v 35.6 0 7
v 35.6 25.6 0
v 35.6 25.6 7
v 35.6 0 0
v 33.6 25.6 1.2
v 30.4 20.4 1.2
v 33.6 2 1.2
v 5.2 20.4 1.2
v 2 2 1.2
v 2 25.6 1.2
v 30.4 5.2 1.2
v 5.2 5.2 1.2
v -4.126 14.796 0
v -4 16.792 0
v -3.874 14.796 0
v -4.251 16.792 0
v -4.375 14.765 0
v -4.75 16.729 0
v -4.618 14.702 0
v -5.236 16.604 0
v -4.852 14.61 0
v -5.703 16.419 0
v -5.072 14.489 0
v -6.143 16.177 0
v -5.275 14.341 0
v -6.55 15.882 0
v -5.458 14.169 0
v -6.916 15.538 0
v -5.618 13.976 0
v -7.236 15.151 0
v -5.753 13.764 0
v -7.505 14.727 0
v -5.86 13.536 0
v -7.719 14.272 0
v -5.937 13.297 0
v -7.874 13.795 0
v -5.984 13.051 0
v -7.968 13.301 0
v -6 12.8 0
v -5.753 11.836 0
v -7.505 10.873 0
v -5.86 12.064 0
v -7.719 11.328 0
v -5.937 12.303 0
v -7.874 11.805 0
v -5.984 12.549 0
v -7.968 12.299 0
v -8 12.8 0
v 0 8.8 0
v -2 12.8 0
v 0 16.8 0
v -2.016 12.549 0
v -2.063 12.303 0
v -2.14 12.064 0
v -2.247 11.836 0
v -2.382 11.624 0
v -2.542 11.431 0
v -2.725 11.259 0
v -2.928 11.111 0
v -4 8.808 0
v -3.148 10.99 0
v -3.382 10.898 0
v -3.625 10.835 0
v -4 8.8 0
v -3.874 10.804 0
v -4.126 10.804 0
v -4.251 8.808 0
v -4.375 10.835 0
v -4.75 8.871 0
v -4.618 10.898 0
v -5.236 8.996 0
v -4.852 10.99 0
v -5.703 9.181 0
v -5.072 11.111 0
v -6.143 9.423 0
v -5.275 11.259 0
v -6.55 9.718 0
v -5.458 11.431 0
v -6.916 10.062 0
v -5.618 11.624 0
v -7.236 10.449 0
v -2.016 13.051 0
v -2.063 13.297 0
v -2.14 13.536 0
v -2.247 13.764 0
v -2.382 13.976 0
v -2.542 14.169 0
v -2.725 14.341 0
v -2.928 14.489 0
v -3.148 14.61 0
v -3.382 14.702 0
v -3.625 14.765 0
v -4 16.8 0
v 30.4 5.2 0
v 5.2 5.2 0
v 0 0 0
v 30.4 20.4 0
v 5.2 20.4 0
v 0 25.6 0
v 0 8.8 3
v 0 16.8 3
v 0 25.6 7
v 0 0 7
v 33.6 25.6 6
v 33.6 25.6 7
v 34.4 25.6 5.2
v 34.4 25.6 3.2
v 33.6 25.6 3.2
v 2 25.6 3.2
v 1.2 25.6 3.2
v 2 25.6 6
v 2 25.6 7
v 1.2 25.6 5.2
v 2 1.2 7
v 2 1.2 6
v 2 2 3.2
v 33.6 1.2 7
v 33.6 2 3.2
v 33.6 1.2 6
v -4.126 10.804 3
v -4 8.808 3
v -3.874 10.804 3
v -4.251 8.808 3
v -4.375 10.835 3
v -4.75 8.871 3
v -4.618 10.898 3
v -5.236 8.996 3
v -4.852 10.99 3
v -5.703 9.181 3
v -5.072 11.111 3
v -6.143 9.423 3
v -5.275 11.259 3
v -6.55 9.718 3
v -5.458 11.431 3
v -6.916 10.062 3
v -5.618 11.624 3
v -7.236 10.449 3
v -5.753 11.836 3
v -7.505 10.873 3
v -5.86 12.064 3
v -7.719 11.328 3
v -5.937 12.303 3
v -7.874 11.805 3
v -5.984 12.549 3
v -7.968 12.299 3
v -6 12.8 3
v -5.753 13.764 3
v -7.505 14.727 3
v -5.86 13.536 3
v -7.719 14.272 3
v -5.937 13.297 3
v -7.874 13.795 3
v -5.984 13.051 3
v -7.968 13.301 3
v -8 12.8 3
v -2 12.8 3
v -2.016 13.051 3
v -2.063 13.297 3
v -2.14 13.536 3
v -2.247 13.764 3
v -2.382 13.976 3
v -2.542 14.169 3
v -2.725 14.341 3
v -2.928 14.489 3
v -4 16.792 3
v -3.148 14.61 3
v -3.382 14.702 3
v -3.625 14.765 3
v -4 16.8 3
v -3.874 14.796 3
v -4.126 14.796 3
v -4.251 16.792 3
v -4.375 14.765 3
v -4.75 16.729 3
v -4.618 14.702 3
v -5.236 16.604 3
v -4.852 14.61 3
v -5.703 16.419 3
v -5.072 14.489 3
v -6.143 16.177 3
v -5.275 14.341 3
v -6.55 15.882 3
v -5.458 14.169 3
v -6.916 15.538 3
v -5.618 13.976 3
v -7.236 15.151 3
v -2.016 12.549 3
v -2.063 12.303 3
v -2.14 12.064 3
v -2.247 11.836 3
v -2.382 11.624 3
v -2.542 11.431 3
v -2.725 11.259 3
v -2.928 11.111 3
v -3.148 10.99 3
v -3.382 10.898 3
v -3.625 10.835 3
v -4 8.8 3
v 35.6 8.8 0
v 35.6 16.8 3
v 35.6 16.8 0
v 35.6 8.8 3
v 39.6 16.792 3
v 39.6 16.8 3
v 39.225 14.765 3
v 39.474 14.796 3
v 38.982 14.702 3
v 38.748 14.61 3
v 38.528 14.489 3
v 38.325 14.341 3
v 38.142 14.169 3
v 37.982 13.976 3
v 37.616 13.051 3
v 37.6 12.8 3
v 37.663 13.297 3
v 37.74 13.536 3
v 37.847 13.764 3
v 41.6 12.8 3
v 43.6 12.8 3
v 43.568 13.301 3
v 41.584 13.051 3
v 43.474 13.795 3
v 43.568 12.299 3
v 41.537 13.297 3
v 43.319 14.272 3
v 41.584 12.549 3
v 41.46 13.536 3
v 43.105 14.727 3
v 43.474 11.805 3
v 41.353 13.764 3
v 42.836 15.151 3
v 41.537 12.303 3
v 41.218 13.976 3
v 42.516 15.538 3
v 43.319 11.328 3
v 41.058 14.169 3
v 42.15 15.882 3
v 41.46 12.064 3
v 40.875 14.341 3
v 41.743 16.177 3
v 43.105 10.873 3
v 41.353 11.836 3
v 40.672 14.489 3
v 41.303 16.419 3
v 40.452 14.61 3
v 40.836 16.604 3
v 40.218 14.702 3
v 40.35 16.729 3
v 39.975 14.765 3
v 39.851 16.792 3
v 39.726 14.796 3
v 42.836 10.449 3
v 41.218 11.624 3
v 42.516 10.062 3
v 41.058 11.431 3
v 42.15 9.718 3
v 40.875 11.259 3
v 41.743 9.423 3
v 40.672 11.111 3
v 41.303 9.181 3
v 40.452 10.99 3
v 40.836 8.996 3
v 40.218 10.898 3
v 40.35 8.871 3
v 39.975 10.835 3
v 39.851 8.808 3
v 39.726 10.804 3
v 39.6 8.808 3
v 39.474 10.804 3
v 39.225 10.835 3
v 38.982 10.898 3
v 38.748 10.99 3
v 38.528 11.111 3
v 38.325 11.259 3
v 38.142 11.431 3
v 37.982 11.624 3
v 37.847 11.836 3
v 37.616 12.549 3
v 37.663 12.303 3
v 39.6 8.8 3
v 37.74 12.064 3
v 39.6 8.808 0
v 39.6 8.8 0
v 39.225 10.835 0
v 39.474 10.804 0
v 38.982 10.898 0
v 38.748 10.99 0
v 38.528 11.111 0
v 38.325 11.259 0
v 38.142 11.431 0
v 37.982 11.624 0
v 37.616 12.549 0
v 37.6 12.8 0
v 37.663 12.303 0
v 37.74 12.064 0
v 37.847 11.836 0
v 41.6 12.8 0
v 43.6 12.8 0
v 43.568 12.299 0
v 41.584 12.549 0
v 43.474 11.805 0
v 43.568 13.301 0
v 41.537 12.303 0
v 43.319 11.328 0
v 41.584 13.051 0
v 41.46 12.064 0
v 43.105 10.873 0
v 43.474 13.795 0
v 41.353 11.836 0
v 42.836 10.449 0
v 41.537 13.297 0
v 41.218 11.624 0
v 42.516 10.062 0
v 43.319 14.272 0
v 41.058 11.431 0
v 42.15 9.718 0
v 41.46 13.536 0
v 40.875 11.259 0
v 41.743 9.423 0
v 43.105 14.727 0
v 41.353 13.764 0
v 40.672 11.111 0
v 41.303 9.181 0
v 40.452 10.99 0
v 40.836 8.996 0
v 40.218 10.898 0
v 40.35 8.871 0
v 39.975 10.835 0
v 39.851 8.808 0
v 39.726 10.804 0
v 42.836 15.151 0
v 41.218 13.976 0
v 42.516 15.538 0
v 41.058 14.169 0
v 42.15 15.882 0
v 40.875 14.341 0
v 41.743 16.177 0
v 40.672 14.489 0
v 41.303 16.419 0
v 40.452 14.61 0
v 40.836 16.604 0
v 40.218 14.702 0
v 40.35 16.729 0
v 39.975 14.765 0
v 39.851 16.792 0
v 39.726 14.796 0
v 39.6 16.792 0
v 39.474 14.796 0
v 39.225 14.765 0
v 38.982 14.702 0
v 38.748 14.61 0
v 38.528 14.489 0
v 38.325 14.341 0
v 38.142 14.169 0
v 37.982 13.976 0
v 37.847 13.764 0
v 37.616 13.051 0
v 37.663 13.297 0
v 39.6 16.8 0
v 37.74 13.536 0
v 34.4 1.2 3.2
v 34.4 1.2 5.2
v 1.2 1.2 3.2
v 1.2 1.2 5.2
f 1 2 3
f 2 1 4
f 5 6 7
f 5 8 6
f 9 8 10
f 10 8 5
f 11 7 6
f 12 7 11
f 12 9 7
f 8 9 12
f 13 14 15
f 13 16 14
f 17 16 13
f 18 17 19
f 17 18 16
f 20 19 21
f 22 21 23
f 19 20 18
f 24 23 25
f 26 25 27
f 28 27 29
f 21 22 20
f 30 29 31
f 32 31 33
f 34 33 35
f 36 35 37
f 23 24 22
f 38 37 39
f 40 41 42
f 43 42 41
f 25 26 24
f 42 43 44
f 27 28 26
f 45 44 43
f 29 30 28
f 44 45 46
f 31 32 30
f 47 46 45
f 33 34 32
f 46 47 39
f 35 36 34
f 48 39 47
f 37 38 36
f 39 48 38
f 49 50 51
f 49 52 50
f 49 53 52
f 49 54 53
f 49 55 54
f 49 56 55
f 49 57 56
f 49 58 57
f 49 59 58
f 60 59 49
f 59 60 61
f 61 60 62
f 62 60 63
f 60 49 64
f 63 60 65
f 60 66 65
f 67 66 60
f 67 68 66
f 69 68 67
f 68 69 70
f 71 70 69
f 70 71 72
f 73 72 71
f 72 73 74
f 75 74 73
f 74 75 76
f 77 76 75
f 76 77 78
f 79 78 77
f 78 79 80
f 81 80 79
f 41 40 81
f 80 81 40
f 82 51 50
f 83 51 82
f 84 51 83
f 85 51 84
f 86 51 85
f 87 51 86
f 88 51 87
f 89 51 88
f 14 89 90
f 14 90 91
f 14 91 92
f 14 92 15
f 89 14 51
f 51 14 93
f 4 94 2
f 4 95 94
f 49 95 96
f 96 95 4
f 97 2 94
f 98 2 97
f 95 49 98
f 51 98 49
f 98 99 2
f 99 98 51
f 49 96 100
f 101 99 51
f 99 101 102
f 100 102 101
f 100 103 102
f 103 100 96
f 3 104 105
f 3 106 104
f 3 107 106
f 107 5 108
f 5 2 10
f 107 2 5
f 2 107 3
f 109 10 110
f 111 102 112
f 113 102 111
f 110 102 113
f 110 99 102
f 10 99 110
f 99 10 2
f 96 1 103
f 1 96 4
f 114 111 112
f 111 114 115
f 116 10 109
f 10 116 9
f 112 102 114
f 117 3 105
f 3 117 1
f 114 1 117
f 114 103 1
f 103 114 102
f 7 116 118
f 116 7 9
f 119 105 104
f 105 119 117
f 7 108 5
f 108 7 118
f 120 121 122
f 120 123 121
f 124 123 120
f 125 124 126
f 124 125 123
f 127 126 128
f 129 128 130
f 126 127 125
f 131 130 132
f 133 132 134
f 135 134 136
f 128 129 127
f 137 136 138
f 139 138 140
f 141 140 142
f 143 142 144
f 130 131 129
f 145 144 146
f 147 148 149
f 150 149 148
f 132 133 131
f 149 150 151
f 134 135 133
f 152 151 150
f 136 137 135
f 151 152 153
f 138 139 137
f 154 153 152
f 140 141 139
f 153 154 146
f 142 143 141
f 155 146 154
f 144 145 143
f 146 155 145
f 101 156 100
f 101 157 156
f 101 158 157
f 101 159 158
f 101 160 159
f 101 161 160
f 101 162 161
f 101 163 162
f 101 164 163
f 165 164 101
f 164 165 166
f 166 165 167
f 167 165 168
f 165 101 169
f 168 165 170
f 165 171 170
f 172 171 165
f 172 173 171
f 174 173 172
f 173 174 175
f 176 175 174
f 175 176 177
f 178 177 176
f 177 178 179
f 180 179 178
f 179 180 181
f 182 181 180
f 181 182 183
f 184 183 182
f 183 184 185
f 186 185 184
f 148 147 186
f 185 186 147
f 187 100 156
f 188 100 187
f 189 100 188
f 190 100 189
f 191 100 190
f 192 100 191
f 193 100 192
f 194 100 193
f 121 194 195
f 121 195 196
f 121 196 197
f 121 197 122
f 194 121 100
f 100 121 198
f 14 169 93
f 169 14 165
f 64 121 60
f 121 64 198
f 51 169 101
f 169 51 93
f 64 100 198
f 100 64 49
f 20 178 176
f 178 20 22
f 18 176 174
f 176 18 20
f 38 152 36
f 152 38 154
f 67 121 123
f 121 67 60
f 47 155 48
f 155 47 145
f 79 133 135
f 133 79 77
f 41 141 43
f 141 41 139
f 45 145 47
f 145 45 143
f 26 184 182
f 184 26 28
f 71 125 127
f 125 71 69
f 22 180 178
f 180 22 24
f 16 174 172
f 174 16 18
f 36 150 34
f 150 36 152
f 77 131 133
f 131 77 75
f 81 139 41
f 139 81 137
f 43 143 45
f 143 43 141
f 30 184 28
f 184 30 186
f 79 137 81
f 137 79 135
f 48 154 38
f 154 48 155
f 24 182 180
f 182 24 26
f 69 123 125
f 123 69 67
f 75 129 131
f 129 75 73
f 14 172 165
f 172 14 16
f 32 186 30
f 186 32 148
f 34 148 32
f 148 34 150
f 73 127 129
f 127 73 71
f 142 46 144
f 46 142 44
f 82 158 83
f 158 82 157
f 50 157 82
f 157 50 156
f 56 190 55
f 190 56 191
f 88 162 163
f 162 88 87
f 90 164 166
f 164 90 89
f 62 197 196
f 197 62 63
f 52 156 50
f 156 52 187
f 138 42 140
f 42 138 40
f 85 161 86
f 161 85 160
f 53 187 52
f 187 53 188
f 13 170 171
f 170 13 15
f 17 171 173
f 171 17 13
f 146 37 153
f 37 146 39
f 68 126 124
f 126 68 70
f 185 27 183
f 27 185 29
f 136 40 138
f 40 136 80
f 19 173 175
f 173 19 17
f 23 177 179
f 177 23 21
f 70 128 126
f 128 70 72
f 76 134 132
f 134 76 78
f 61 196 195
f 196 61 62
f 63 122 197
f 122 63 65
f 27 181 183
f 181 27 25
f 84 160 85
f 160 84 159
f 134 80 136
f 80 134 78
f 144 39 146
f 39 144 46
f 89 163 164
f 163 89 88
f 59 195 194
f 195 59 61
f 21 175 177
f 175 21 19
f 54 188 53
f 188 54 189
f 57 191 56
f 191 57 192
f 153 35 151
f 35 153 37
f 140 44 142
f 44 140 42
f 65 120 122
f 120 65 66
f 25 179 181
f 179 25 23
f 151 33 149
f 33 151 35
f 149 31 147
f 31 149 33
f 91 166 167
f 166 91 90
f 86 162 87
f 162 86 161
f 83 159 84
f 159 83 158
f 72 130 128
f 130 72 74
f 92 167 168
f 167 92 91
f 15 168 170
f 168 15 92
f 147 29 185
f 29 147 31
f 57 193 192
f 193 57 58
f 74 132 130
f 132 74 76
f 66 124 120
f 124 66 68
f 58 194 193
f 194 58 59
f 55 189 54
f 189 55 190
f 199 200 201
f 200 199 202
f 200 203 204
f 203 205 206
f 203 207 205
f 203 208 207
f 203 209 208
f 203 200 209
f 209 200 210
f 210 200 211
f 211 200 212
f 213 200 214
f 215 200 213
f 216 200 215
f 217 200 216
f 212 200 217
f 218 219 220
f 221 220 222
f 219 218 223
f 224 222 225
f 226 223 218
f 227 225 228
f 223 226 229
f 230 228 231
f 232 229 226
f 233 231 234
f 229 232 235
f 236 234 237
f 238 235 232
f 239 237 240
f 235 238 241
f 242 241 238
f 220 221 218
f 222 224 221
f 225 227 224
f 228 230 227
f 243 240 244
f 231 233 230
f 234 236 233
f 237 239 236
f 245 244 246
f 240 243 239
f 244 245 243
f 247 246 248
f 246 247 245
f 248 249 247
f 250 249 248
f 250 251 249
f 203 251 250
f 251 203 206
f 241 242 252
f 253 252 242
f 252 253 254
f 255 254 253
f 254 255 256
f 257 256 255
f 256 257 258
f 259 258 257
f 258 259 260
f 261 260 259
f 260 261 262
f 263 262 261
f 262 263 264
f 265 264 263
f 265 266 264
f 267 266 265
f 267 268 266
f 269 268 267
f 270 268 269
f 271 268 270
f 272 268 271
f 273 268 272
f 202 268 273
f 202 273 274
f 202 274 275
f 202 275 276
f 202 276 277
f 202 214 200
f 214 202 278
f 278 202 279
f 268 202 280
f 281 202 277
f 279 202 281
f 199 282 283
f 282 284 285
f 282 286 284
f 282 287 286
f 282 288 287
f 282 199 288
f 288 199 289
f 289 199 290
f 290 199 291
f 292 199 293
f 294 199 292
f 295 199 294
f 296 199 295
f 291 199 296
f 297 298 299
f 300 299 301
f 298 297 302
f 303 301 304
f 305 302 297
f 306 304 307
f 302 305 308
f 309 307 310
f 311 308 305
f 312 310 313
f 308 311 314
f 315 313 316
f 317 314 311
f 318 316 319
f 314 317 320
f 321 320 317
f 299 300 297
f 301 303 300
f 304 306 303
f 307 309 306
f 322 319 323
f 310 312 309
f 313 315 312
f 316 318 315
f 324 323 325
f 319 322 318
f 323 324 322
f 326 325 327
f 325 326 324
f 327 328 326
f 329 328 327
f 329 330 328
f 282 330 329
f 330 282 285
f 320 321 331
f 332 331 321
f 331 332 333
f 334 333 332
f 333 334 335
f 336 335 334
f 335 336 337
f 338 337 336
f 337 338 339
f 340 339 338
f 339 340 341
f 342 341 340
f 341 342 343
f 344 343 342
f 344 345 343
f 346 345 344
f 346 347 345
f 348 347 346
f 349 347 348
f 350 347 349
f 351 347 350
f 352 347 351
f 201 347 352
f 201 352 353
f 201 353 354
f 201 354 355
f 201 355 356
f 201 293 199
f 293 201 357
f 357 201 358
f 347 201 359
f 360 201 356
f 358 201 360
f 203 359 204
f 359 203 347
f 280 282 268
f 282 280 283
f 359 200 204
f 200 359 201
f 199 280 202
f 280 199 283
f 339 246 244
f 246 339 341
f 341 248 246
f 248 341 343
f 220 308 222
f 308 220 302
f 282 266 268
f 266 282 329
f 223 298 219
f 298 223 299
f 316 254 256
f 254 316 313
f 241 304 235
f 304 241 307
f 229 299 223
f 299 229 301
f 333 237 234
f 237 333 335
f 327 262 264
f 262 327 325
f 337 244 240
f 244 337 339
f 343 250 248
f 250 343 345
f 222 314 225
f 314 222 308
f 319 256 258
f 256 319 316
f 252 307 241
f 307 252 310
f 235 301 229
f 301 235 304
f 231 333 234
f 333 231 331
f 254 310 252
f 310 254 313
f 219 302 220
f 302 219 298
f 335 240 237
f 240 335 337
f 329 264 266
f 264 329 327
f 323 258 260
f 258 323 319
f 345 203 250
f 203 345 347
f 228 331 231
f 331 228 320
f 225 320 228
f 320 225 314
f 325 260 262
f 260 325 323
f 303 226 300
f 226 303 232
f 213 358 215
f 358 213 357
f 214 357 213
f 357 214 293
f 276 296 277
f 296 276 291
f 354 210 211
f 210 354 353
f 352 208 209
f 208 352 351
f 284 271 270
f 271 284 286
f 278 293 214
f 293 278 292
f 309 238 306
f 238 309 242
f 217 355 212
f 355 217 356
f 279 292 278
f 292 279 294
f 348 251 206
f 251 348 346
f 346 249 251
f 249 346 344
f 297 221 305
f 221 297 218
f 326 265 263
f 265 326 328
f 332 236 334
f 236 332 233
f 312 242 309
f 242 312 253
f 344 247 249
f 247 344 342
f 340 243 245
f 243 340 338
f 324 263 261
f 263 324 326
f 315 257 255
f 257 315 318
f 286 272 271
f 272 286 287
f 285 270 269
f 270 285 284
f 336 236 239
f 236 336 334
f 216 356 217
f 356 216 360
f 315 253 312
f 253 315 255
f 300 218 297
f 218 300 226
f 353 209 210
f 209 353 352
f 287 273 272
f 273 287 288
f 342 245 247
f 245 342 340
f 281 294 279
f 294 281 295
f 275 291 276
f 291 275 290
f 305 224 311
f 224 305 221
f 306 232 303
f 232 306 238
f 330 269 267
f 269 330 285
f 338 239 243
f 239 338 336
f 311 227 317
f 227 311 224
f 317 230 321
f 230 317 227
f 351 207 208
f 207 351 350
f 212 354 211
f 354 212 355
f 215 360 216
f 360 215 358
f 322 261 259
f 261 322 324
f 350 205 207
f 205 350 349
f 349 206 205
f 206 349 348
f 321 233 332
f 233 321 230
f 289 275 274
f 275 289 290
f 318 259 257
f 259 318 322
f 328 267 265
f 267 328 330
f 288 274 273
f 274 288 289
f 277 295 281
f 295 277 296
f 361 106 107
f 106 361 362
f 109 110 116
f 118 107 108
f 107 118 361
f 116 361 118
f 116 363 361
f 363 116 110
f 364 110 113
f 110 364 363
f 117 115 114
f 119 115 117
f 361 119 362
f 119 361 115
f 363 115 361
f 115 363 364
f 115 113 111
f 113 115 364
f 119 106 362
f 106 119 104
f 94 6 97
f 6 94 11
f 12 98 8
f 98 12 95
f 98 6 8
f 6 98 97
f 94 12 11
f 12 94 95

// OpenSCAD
// file: ../lib/pcb_led_cvf.scad
// for led power module modified

/* bluetooth_mate_holder.scad
 * By John Biehler - November 17, 2011
 * http://www.thingiverse.com/thing:

 * derived from pcb_box_slide_with_tabs.scad
 * By Nicholas C Lewis - Jan 1, 2011
 * http://www.thingiverse.com/thing:5396
 *
 * derived from pcb_box_slide.scad
 *     Parametric, open PCB-box (slide-in) by chlunde
 *     http://www.thingiverse.com/thing:4071
 *
 * CHANGES
 * - adjusted to fit Arduino Mega
 * - added mounting tabs
 * - turned off cutouts
 * - adjusted bottom cutout size
 */

$fn=50;

module pcb_led_cvf(

	pcb_width = 48.2,
	pcb_length =24.1,
	pcb_height =1.1,
	slisse = 0.8,

	pcb_bottom_margin = 1,
	wall_width_thick = 2,
	box_height = 7,

	//tab parameters
	tab_hole_radius=2,
	tab_outer_radius=4,

	inner_margin = 4,

	add_tabs = true

) {
	wall_width = wall_width_thick-slisse;

module tab() {
	difference(){
		union() {
			translate([-tab_outer_radius,-tab_outer_radius,0])
			cube([tab_outer_radius,2*tab_outer_radius,wall_width_thick+1]);
			translate([-tab_outer_radius,0,0])
				cylinder(r=tab_outer_radius, h = wall_width_thick+1);
		}
		translate([-tab_outer_radius,0,0]) {
			cylinder(r= tab_hole_radius, h = wall_width_thick+5,center=true);
		}
	}

}

module box() {
	union() {
		cube([pcb_width + 2*wall_width, pcb_length + 2*wall_width, wall_width]);

		cube([wall_width_thick, pcb_length + 2*wall_width, box_height]);

		cube([pcb_width + 2*wall_width, wall_width_thick, box_height]);

		%translate([0, pcb_length+wall_width, 0])
			cube([pcb_width + 2*wall_width,wall_width,box_height]);

		translate([pcb_width + wall_width - slisse,0,0])
			cube([wall_width_thick, pcb_length + 2*wall_width, box_height]);
	}
	if(add_tabs) {
//comment out this part to remove tabs
		for(i=[(pcb_length + 2*wall_width)/2]){
	translate([0,i,0])tab();
	translate([pcb_width + 2*wall_width,i,0])mirror()tab();
		}
	}

}

module pcb() {
	translate([wall_width, wall_width, wall_width + pcb_bottom_margin])
		cube([pcb_width,pcb_length + wall_width + 0.1,pcb_height]);
	translate([wall_width, wall_width, wall_width + pcb_bottom_margin+pcb_height])rotate([0,45,0])
		cube([pcb_height,pcb_length + wall_width + 0.1,pcb_height]);
	translate([wall_width+pcb_width-2*cos(45)*pcb_height, wall_width, wall_width + pcb_bottom_margin+pcb_height])rotate([0,45,0])
		cube([pcb_height,pcb_length + wall_width + 0.1,pcb_height]);
	translate([wall_width_thick, wall_width, wall_width + pcb_bottom_margin])
		cube([pcb_width-2*slisse,pcb_length + wall_width + 0.1,box_height]);

}



module holes() {
		*translate([wall_width + pcb_width/2, wall_width_thick + 0.1, pcb_width/2+wall_width])
			rotate(a=90,v=[1,0,0])
				cylinder(r=pcb_width/2, h=wall_width_thick + 0.2);

		*translate([-0.1, wall_width + pcb_length/2, pcb_length/2 + wall_width])
			rotate(a=90,v=[0,1,0])
				cylinder(r=pcb_length/2, h=wall_width_thick + 0.2);

		*translate([pcb_width + wall_width - slisse - 0.1, wall_width + pcb_length/2, pcb_length/2 + wall_width])
			rotate(a=90,v=[0,1,0])
				cylinder(r=pcb_length/2, h=wall_width_thick + 0.2);

	 * translate([pcb_width/2 + wall_width, wall_width + pcb_length/2, -0.1])
			rotate(a=0,v=[0,1,0])
				cylinder(r=min(pcb_length,pcb_width)/2 - wall_width/2, h=wall_width_thick + 0.2);

		translate([inner_margin +wall_width, inner_margin+wall_width, -0.1])
			cube([pcb_width-inner_margin*2,pcb_length -inner_margin*2,wall_width + 0.2]);
}

	difference() {
		box();
		pcb();
		holes();
	}
}



pcb_led_cvf();
// main file
use <../lib/pcb_led_cvf.scad>

$fn = 50;

pcb_led_cvf(
  pcb_length=23.2,
  pcb_width=33.2,
  pcb_height=2,
  pcb_bottom_margin=2
);
